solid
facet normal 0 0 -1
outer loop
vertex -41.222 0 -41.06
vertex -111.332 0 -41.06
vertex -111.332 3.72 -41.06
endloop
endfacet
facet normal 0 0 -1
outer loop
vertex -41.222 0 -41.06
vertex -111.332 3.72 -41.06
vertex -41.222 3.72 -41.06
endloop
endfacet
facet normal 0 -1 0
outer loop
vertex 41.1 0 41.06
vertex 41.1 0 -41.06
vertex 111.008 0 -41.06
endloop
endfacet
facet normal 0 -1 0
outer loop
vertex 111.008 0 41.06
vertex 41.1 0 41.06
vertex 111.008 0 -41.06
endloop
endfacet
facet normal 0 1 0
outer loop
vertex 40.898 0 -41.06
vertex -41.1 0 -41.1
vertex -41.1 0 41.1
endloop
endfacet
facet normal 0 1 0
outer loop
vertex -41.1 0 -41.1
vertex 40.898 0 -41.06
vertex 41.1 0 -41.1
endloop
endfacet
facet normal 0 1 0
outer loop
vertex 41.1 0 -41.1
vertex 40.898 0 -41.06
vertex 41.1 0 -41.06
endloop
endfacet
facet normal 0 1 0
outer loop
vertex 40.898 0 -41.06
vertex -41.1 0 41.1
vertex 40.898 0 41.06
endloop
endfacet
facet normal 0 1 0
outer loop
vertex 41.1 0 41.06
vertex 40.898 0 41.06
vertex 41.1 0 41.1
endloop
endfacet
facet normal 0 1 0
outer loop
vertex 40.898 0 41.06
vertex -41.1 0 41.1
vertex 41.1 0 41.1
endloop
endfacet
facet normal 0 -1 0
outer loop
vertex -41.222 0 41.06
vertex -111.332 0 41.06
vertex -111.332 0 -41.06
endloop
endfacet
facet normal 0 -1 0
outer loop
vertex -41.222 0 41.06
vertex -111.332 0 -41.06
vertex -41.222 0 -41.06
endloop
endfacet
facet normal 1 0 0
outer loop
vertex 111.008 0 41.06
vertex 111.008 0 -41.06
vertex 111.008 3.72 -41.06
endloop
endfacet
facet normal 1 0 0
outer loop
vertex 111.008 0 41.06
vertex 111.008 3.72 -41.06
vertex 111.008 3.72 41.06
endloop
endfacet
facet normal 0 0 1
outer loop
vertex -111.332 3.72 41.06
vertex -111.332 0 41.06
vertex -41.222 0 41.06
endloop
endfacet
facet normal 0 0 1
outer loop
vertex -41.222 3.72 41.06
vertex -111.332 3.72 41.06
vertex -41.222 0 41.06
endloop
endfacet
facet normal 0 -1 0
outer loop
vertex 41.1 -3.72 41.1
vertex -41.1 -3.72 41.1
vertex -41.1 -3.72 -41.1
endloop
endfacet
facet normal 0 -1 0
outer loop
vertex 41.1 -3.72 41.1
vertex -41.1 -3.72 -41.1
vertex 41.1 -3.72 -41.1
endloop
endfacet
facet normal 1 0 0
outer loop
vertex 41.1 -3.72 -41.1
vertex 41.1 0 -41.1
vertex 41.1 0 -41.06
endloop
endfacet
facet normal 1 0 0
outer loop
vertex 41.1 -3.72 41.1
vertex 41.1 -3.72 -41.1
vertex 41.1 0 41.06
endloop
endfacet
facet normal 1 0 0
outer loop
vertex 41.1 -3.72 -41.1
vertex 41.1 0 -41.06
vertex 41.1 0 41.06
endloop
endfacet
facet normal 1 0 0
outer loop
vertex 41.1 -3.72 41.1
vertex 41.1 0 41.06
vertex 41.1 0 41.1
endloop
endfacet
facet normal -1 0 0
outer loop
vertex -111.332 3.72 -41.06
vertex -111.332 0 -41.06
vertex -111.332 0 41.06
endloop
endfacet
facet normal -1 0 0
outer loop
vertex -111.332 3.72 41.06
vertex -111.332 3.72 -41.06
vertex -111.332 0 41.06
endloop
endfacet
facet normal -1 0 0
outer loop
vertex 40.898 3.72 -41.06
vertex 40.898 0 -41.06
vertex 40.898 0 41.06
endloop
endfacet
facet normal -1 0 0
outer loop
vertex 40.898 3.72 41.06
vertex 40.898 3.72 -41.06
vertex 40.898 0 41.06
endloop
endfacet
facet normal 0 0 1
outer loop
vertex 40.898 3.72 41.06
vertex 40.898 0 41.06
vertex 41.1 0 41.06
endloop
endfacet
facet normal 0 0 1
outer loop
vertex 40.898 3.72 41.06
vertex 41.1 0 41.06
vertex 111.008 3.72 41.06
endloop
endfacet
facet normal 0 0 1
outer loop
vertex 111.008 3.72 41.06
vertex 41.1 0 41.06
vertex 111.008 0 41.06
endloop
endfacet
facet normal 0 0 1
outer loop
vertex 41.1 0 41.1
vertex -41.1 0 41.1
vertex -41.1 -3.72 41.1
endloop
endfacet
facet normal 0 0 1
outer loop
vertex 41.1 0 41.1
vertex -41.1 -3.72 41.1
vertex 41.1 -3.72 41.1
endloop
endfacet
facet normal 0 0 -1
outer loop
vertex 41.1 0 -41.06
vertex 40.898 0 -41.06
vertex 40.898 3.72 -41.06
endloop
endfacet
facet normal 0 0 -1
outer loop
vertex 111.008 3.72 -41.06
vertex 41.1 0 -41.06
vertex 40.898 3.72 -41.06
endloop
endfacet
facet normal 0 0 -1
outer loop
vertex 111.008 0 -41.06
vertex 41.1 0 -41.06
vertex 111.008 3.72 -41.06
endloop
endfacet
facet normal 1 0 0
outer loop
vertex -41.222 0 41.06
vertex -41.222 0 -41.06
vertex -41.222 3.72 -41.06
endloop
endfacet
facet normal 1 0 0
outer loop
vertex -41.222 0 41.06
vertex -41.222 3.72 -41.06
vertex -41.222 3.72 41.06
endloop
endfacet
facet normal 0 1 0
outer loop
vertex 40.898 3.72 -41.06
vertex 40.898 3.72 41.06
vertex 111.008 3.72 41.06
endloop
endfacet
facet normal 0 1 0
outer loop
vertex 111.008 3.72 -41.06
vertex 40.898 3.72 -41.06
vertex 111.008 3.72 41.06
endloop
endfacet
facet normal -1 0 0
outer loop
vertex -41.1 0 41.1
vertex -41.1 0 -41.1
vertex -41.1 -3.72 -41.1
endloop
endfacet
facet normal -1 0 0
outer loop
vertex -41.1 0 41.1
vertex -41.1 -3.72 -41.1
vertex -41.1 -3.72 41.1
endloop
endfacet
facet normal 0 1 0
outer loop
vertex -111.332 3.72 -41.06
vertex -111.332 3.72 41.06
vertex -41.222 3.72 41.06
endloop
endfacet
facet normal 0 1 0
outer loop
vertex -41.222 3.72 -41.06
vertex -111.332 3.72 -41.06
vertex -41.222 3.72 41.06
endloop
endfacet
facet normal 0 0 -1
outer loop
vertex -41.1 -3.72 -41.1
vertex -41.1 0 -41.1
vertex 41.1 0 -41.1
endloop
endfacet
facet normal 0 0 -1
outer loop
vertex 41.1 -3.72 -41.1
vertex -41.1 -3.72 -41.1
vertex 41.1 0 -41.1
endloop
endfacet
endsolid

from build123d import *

# Parameters (mm, degrees)
F0_W     = 82.199988
F0_H     = 82.199988
F2_DEPTH = 3.719999926
F1_W     = 70.1101869345
F1_H     = 82.1198001504
F3_DEPTH = 3.719999926


# Not quite as in the source:
# - a feature of the source that left no trace in its solid (it failed there, or was rolled back) is left out


with BuildPart() as f2:
    # F0 (on Front) → F2 (new body)
    with BuildSketch(Plane.XZ):
        Rectangle(F0_W, F0_H)
    extrude(amount=F2_DEPTH)

    # F1 (on Front) → F3, piece 2 (join)
    with BuildSketch(Plane.XZ):
        with Locations((75.9527012706, 0)):
            Rectangle(F1_W, F1_H)
    extrude(amount=-F3_DEPTH)


with BuildPart() as f3:
    # F1 (on Front) → F3 (new body)
    with BuildSketch(Plane.XZ):
        with Locations((-76.2772858143, 0)):
            Rectangle(F1_W, F1_H)
    extrude(amount=-F3_DEPTH)


solid = Compound([f2.part, f3.part])
